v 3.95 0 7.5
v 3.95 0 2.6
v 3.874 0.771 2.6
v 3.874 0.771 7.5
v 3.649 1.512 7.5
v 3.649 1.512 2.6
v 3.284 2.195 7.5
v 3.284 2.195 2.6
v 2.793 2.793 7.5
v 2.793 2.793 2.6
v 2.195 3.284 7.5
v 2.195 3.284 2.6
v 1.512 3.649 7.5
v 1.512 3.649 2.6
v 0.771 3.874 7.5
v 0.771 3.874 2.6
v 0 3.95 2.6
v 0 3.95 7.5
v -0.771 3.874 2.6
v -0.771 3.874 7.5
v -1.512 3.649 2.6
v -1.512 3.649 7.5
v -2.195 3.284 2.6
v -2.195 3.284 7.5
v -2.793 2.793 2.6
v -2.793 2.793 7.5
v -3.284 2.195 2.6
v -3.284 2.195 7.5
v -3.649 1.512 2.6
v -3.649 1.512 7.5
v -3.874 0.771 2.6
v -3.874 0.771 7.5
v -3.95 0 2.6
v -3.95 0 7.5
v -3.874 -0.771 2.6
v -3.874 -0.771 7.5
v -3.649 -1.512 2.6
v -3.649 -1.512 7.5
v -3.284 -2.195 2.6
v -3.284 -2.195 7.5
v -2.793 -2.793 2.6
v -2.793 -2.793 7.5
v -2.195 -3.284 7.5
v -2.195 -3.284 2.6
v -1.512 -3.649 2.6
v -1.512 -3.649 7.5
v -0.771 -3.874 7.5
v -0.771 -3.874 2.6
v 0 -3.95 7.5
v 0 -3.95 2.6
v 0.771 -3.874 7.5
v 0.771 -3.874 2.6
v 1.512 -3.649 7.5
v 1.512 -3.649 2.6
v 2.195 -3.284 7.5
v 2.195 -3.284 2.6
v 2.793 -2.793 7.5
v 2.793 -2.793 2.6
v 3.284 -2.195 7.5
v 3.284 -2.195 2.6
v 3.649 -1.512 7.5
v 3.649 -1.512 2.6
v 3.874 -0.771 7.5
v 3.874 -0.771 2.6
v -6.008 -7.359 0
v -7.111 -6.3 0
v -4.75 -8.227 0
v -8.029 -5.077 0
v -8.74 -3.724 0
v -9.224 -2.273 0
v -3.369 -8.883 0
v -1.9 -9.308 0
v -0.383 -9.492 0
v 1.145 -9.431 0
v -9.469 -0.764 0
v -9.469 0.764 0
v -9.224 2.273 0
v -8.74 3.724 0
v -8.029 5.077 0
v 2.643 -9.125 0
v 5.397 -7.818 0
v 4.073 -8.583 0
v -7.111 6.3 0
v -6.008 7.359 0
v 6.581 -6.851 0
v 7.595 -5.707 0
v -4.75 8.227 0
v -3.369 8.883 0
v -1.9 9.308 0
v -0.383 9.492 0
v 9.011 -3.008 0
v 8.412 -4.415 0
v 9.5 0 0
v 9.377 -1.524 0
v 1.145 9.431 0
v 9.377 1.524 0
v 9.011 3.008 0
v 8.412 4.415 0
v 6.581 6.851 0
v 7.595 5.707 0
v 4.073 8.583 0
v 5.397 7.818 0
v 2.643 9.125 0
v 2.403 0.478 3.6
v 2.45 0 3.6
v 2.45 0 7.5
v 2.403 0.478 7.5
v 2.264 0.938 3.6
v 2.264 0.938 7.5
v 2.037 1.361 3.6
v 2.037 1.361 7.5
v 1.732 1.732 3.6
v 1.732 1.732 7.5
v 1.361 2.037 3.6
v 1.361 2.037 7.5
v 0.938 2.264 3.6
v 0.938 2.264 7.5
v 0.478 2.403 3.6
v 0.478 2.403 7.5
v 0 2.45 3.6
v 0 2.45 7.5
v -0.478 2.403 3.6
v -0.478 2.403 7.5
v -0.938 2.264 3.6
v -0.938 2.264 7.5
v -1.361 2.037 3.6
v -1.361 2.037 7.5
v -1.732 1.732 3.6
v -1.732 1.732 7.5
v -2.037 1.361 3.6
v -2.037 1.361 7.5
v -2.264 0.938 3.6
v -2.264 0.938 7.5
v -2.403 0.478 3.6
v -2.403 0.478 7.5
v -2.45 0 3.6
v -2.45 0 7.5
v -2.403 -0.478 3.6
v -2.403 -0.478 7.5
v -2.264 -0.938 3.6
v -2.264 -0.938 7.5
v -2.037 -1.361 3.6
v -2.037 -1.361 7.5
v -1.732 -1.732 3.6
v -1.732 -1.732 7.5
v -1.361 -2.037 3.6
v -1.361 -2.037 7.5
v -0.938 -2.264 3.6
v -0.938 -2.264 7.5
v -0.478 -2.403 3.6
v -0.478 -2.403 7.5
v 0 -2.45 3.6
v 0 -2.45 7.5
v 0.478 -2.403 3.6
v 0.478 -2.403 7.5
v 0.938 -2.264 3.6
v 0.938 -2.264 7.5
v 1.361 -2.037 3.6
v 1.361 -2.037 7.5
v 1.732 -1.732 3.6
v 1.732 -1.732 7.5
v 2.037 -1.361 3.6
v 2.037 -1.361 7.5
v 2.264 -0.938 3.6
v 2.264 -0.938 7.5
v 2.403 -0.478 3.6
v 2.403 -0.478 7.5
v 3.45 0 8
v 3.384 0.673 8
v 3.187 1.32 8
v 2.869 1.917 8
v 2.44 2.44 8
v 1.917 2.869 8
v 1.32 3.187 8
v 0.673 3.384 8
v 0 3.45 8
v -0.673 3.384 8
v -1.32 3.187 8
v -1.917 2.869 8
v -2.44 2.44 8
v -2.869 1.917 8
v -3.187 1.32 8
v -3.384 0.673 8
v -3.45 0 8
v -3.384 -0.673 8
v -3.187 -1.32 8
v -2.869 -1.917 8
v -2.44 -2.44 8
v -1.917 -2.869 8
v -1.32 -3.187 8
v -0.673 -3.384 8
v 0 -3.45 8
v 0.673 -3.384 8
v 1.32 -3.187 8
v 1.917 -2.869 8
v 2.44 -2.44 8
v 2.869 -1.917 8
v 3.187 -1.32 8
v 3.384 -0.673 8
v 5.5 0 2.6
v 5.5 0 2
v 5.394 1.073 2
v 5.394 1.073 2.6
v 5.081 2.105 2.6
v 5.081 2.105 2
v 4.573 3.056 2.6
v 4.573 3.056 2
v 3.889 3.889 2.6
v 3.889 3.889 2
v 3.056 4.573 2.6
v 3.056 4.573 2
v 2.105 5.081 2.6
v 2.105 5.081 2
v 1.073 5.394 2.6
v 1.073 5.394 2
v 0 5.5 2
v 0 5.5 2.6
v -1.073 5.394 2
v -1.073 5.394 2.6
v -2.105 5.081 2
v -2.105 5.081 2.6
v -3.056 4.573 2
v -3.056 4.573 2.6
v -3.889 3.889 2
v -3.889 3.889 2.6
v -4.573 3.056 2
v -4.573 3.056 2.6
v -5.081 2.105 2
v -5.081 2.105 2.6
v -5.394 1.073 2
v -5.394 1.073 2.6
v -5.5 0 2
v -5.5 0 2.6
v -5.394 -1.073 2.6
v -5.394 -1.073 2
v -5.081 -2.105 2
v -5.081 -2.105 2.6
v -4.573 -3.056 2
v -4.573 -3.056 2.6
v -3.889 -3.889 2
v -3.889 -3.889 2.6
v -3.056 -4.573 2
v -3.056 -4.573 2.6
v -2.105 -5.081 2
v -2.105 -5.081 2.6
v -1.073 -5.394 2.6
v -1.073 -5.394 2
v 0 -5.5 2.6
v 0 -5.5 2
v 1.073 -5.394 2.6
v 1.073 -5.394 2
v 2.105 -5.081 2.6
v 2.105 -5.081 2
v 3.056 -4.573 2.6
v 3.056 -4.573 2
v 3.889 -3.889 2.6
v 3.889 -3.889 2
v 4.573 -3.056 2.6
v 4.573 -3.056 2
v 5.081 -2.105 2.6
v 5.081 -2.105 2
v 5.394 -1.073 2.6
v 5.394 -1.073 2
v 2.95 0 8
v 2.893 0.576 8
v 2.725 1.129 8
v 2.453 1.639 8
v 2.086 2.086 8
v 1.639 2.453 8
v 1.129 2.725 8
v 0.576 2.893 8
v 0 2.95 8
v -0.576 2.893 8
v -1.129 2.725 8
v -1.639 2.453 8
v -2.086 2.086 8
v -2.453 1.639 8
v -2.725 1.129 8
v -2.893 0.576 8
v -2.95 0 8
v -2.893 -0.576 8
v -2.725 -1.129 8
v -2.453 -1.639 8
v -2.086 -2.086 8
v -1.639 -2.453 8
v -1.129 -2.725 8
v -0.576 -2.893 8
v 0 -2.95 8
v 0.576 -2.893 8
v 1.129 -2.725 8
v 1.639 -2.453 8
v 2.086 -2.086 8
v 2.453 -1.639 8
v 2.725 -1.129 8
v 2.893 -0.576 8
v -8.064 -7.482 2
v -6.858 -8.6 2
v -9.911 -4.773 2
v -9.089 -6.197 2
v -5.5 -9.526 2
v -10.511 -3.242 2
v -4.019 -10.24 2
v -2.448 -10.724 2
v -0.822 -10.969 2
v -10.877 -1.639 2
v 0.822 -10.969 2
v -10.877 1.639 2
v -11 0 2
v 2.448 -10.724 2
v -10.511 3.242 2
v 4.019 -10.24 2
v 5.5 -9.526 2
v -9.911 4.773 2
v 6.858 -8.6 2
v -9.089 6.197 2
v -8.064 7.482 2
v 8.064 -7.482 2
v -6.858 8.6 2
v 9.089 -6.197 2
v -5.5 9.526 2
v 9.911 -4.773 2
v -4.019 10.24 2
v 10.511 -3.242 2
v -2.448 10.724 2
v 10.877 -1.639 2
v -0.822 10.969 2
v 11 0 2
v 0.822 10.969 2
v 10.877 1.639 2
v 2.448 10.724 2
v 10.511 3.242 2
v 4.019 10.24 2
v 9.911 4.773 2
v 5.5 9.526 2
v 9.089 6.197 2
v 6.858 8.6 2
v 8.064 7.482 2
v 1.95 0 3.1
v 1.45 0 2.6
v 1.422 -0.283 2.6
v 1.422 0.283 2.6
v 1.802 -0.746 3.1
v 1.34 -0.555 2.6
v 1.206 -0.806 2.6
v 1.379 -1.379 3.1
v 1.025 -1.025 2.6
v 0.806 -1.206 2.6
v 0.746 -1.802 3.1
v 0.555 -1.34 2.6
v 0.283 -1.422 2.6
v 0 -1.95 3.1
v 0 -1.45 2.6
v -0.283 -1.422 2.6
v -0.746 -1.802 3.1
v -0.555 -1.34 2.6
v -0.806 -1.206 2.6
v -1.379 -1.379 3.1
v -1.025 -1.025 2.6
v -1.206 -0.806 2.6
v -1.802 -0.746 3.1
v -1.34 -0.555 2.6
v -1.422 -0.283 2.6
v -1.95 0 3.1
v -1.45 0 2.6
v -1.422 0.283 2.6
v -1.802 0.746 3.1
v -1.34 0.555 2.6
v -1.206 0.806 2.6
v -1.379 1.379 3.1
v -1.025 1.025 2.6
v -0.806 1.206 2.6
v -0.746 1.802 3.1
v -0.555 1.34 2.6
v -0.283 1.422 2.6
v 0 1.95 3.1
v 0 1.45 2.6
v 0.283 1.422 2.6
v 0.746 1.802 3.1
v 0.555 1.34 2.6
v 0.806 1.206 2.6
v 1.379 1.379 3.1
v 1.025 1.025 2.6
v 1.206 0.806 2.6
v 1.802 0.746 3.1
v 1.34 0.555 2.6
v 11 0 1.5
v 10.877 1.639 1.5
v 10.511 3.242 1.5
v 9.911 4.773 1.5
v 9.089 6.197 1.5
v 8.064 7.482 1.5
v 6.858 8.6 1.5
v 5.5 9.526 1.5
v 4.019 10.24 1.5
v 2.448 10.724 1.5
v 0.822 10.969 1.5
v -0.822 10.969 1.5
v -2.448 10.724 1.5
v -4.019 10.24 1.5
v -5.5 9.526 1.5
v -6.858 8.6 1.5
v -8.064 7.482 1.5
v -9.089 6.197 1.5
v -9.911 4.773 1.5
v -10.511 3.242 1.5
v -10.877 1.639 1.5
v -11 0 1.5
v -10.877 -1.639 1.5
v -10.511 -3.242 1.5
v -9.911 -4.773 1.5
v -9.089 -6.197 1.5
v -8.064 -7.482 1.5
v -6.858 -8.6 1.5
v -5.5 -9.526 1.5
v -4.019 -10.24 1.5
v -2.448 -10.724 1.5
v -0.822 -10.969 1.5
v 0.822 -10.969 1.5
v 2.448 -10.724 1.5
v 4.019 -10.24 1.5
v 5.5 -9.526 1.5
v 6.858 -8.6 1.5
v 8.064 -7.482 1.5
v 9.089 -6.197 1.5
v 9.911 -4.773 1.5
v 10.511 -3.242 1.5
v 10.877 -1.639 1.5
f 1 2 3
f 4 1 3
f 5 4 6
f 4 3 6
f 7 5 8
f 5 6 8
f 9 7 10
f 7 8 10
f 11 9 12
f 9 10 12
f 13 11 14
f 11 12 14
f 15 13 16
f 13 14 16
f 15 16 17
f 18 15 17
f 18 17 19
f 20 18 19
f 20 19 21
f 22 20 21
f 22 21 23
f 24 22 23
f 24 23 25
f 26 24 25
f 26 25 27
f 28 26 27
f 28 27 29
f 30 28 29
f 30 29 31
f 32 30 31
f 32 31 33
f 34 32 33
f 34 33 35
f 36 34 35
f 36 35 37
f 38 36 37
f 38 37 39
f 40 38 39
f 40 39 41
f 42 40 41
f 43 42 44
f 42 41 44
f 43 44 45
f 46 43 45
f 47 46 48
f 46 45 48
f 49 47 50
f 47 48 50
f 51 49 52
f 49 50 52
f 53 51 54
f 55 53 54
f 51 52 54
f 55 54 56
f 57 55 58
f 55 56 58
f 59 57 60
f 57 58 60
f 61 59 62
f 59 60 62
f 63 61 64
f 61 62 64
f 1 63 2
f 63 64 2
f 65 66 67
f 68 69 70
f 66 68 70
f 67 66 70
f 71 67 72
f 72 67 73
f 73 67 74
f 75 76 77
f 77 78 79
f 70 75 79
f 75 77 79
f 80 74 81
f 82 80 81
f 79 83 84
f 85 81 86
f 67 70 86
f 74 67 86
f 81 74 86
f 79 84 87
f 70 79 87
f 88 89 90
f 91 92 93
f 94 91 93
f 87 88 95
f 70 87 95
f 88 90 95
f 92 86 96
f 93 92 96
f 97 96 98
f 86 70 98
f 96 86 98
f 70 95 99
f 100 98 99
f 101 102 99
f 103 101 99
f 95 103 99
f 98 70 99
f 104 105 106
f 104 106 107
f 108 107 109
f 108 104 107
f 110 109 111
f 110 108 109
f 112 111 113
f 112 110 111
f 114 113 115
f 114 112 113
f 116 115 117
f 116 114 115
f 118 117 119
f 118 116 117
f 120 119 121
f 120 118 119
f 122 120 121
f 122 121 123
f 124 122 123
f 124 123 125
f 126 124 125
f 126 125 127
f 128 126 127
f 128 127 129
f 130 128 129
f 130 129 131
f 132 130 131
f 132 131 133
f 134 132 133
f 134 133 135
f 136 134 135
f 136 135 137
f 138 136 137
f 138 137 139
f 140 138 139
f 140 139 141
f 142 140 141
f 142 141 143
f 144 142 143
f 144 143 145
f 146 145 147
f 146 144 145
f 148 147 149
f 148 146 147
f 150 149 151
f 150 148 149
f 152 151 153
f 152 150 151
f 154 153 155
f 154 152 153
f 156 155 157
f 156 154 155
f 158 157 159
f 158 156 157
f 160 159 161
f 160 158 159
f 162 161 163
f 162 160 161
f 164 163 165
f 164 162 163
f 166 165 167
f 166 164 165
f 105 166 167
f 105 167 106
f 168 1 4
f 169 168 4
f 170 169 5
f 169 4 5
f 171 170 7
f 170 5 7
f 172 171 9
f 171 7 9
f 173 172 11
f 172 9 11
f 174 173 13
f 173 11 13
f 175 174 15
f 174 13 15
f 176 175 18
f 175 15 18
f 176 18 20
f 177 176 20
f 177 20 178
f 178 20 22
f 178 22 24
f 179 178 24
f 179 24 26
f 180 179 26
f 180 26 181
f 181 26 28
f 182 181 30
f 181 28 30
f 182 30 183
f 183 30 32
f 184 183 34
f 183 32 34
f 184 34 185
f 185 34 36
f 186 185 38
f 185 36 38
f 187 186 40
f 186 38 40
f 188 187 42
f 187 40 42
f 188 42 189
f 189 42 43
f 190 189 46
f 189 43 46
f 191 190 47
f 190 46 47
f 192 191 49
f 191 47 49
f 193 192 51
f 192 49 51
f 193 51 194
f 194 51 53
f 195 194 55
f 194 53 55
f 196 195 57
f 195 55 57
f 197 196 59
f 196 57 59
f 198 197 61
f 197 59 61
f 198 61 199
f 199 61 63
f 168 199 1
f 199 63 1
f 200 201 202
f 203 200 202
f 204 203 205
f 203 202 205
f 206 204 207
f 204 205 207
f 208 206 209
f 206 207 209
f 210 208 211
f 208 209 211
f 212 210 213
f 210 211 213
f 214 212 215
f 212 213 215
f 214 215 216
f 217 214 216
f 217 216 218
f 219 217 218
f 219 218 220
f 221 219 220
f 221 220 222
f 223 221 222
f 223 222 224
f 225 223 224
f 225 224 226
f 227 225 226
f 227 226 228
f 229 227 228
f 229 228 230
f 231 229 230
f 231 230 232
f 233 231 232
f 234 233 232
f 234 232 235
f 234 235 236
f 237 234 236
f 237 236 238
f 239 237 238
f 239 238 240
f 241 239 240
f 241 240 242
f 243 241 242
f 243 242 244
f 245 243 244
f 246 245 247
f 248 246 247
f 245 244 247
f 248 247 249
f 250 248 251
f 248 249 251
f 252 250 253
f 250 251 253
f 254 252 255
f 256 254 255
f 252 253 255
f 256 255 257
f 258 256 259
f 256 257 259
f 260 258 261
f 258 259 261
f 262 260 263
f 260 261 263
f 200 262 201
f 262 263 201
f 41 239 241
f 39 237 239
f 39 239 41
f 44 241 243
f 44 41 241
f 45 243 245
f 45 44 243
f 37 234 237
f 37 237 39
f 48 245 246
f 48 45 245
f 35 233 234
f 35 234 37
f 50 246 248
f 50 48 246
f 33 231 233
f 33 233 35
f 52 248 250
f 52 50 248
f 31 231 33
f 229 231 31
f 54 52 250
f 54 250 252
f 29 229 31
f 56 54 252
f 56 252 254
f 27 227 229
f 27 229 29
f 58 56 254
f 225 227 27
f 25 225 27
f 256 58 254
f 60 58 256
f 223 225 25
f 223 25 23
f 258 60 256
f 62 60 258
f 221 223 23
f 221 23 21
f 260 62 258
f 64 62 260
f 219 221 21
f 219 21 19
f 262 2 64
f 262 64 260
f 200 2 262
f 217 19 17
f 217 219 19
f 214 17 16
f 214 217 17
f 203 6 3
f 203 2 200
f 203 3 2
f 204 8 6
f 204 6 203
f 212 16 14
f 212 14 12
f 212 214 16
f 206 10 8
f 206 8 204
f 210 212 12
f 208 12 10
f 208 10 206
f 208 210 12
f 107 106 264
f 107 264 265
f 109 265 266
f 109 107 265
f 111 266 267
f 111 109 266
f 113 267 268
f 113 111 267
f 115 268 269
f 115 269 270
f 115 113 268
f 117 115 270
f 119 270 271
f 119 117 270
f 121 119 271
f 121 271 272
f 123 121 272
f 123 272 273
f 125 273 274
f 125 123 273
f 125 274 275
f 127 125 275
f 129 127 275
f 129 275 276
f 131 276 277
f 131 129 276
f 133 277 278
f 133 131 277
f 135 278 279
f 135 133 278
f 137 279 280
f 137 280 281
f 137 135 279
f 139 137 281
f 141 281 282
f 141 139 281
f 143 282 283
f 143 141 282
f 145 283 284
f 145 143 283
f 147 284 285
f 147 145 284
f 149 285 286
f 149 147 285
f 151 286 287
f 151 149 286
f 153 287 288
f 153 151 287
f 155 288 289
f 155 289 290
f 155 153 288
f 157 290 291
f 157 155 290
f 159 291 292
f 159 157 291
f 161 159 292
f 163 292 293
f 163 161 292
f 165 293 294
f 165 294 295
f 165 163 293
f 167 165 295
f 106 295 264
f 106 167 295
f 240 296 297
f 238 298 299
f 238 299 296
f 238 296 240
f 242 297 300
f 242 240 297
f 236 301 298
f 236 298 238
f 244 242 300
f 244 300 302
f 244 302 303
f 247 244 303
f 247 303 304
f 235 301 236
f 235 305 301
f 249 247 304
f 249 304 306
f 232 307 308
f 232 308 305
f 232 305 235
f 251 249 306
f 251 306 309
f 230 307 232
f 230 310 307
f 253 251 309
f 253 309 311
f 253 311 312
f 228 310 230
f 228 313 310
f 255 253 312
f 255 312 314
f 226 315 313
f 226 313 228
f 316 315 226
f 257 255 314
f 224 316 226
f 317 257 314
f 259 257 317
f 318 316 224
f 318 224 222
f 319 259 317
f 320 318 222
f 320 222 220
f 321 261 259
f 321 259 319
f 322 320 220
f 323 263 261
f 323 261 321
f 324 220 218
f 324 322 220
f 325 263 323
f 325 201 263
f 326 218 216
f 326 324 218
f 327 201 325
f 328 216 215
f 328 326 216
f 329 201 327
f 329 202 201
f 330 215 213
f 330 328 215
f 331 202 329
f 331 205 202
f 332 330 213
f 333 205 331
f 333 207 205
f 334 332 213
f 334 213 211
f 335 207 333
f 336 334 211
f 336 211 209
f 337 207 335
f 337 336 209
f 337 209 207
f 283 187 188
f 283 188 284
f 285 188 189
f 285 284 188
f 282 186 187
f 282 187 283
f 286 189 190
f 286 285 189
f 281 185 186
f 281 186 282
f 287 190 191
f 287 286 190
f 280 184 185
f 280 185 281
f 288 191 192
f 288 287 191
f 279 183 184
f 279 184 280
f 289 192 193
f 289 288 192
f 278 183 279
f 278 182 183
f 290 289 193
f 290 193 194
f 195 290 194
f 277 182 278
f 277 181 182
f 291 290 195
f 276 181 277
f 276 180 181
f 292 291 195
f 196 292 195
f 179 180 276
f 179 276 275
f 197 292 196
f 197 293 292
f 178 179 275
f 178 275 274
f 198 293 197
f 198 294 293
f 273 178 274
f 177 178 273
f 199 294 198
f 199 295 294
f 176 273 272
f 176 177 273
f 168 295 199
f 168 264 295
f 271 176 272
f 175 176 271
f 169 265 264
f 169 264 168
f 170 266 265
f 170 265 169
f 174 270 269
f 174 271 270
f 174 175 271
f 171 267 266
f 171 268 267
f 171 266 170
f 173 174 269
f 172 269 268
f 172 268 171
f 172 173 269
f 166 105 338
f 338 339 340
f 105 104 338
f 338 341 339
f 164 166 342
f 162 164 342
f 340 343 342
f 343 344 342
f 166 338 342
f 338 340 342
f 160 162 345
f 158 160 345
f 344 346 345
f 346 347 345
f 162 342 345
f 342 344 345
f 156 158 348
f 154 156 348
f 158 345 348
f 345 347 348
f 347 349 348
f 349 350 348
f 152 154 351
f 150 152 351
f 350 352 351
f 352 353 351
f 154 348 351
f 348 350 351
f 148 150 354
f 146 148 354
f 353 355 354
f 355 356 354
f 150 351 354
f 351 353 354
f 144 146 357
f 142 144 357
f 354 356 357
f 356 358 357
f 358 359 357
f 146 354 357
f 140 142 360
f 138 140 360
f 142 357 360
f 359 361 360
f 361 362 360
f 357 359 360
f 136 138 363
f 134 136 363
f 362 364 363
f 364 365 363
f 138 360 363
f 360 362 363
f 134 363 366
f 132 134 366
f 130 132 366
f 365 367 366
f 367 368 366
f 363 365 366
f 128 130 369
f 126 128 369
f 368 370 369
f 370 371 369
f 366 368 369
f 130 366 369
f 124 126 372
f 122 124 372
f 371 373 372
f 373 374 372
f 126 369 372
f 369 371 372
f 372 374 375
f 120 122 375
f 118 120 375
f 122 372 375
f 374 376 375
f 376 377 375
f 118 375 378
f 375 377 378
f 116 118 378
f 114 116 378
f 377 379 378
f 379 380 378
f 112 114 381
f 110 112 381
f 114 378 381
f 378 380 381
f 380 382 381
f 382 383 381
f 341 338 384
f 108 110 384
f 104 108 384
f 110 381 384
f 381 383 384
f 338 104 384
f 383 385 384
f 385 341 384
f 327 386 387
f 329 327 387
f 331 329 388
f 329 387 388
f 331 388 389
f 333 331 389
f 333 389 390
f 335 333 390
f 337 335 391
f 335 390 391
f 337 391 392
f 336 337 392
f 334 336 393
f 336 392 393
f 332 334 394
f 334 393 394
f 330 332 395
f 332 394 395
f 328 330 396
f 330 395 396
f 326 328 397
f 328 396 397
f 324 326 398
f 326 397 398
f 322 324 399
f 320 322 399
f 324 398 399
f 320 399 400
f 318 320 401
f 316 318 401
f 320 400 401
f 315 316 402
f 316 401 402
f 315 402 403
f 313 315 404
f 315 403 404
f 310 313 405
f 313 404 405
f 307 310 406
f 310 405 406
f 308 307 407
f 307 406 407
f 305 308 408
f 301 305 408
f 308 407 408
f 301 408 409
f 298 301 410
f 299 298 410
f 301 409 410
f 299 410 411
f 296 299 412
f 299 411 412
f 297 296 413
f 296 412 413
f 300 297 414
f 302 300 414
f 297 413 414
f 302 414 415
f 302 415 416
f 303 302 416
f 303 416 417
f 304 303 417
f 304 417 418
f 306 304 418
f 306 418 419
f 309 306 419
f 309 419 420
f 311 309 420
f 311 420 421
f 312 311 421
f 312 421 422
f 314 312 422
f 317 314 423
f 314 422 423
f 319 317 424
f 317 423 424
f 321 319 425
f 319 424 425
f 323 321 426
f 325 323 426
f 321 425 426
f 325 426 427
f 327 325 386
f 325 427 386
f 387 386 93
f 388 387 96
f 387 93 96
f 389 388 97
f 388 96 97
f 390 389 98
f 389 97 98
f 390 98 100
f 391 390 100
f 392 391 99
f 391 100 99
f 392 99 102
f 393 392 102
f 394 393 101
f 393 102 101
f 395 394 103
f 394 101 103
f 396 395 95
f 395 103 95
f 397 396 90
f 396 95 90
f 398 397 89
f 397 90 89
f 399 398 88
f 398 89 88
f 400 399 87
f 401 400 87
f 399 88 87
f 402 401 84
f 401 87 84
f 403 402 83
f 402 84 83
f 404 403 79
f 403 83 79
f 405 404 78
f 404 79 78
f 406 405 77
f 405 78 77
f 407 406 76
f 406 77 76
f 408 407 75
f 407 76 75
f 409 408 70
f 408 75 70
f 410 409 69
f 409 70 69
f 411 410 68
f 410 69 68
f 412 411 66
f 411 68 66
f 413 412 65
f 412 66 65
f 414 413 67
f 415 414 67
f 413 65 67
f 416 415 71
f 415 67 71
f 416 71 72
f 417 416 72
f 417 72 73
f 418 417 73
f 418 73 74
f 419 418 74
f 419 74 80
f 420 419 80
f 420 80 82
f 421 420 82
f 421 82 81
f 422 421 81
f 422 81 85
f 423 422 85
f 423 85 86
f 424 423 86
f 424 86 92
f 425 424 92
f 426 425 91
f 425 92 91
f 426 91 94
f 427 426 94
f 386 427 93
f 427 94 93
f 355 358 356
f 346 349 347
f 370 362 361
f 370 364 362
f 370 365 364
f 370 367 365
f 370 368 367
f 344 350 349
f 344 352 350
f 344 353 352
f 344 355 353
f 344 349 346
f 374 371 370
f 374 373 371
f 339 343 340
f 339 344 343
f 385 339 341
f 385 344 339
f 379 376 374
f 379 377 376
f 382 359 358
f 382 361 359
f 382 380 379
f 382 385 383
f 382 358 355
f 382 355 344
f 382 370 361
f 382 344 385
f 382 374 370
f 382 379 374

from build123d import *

# Parameters (mm, degrees)
F0_R     = 11
F0_R_2   = 5.5
F0_R_3   = 3.95
F0_R_4   = 2.45
F1_DEPTH = 2
F2_DEPTH = 2.6
F3_DEPTH = 8
F4_SIZE  = 0.5
F5_SIZE  = 0.5
F6_SIZE  = 1.5
F7_SIZE  = 1


# Not quite as in the source:
# - a feature names something its author has since deleted; it is built from what else it names


with BuildPart() as f1:
    # F0 (on Top) → F1 (new body)
    with BuildSketch(Plane.XY):
        Circle(F0_R)
        Circle(F0_R_2, mode=Mode.SUBTRACT)
        Circle(F0_R_2)
        Circle(F0_R_3, mode=Mode.SUBTRACT)
        Circle(F0_R_3)
        Circle(F0_R_4, mode=Mode.SUBTRACT)
        Circle(F0_R_4)
    extrude(amount=F1_DEPTH)

    # F0 (on Top) → F2 (join)
    with BuildSketch(Plane.XY):
        Circle(F0_R_2)
        Circle(F0_R_3, mode=Mode.SUBTRACT)
        Circle(F0_R_3)
        Circle(F0_R_4, mode=Mode.SUBTRACT)
        Circle(F0_R_4)
    extrude(amount=F2_DEPTH)

    # F0 (on Top) → F3 (join)
    with BuildSketch(Plane.XY):
        Circle(F0_R_3)
        Circle(F0_R_4, mode=Mode.SUBTRACT)
    extrude(amount=F3_DEPTH)

    # F4
    f4_edges = [f1.edges().sort_by_distance(p)[0] for p in [
        (-2.45, 0, 8),
    ]]
    chamfer(f4_edges, length=F4_SIZE)

    # F5
    f5_edges = [f1.edges().sort_by_distance(p)[0] for p in [
        (-3.95, 0, 8),
    ]]
    chamfer(f5_edges, length=F5_SIZE)

    # F6
    f6_edges = [f1.edges().sort_by_distance(p)[0] for p in [
        (-11, 0, 0),
    ]]
    chamfer(f6_edges, length=F6_SIZE)

    # F7
    f7_edges = [f1.edges().sort_by_distance(p)[0] for p in [
        (-2.45, 0, 2.6),
    ]]
    chamfer(f7_edges, length=F7_SIZE)


solid = f1.part
